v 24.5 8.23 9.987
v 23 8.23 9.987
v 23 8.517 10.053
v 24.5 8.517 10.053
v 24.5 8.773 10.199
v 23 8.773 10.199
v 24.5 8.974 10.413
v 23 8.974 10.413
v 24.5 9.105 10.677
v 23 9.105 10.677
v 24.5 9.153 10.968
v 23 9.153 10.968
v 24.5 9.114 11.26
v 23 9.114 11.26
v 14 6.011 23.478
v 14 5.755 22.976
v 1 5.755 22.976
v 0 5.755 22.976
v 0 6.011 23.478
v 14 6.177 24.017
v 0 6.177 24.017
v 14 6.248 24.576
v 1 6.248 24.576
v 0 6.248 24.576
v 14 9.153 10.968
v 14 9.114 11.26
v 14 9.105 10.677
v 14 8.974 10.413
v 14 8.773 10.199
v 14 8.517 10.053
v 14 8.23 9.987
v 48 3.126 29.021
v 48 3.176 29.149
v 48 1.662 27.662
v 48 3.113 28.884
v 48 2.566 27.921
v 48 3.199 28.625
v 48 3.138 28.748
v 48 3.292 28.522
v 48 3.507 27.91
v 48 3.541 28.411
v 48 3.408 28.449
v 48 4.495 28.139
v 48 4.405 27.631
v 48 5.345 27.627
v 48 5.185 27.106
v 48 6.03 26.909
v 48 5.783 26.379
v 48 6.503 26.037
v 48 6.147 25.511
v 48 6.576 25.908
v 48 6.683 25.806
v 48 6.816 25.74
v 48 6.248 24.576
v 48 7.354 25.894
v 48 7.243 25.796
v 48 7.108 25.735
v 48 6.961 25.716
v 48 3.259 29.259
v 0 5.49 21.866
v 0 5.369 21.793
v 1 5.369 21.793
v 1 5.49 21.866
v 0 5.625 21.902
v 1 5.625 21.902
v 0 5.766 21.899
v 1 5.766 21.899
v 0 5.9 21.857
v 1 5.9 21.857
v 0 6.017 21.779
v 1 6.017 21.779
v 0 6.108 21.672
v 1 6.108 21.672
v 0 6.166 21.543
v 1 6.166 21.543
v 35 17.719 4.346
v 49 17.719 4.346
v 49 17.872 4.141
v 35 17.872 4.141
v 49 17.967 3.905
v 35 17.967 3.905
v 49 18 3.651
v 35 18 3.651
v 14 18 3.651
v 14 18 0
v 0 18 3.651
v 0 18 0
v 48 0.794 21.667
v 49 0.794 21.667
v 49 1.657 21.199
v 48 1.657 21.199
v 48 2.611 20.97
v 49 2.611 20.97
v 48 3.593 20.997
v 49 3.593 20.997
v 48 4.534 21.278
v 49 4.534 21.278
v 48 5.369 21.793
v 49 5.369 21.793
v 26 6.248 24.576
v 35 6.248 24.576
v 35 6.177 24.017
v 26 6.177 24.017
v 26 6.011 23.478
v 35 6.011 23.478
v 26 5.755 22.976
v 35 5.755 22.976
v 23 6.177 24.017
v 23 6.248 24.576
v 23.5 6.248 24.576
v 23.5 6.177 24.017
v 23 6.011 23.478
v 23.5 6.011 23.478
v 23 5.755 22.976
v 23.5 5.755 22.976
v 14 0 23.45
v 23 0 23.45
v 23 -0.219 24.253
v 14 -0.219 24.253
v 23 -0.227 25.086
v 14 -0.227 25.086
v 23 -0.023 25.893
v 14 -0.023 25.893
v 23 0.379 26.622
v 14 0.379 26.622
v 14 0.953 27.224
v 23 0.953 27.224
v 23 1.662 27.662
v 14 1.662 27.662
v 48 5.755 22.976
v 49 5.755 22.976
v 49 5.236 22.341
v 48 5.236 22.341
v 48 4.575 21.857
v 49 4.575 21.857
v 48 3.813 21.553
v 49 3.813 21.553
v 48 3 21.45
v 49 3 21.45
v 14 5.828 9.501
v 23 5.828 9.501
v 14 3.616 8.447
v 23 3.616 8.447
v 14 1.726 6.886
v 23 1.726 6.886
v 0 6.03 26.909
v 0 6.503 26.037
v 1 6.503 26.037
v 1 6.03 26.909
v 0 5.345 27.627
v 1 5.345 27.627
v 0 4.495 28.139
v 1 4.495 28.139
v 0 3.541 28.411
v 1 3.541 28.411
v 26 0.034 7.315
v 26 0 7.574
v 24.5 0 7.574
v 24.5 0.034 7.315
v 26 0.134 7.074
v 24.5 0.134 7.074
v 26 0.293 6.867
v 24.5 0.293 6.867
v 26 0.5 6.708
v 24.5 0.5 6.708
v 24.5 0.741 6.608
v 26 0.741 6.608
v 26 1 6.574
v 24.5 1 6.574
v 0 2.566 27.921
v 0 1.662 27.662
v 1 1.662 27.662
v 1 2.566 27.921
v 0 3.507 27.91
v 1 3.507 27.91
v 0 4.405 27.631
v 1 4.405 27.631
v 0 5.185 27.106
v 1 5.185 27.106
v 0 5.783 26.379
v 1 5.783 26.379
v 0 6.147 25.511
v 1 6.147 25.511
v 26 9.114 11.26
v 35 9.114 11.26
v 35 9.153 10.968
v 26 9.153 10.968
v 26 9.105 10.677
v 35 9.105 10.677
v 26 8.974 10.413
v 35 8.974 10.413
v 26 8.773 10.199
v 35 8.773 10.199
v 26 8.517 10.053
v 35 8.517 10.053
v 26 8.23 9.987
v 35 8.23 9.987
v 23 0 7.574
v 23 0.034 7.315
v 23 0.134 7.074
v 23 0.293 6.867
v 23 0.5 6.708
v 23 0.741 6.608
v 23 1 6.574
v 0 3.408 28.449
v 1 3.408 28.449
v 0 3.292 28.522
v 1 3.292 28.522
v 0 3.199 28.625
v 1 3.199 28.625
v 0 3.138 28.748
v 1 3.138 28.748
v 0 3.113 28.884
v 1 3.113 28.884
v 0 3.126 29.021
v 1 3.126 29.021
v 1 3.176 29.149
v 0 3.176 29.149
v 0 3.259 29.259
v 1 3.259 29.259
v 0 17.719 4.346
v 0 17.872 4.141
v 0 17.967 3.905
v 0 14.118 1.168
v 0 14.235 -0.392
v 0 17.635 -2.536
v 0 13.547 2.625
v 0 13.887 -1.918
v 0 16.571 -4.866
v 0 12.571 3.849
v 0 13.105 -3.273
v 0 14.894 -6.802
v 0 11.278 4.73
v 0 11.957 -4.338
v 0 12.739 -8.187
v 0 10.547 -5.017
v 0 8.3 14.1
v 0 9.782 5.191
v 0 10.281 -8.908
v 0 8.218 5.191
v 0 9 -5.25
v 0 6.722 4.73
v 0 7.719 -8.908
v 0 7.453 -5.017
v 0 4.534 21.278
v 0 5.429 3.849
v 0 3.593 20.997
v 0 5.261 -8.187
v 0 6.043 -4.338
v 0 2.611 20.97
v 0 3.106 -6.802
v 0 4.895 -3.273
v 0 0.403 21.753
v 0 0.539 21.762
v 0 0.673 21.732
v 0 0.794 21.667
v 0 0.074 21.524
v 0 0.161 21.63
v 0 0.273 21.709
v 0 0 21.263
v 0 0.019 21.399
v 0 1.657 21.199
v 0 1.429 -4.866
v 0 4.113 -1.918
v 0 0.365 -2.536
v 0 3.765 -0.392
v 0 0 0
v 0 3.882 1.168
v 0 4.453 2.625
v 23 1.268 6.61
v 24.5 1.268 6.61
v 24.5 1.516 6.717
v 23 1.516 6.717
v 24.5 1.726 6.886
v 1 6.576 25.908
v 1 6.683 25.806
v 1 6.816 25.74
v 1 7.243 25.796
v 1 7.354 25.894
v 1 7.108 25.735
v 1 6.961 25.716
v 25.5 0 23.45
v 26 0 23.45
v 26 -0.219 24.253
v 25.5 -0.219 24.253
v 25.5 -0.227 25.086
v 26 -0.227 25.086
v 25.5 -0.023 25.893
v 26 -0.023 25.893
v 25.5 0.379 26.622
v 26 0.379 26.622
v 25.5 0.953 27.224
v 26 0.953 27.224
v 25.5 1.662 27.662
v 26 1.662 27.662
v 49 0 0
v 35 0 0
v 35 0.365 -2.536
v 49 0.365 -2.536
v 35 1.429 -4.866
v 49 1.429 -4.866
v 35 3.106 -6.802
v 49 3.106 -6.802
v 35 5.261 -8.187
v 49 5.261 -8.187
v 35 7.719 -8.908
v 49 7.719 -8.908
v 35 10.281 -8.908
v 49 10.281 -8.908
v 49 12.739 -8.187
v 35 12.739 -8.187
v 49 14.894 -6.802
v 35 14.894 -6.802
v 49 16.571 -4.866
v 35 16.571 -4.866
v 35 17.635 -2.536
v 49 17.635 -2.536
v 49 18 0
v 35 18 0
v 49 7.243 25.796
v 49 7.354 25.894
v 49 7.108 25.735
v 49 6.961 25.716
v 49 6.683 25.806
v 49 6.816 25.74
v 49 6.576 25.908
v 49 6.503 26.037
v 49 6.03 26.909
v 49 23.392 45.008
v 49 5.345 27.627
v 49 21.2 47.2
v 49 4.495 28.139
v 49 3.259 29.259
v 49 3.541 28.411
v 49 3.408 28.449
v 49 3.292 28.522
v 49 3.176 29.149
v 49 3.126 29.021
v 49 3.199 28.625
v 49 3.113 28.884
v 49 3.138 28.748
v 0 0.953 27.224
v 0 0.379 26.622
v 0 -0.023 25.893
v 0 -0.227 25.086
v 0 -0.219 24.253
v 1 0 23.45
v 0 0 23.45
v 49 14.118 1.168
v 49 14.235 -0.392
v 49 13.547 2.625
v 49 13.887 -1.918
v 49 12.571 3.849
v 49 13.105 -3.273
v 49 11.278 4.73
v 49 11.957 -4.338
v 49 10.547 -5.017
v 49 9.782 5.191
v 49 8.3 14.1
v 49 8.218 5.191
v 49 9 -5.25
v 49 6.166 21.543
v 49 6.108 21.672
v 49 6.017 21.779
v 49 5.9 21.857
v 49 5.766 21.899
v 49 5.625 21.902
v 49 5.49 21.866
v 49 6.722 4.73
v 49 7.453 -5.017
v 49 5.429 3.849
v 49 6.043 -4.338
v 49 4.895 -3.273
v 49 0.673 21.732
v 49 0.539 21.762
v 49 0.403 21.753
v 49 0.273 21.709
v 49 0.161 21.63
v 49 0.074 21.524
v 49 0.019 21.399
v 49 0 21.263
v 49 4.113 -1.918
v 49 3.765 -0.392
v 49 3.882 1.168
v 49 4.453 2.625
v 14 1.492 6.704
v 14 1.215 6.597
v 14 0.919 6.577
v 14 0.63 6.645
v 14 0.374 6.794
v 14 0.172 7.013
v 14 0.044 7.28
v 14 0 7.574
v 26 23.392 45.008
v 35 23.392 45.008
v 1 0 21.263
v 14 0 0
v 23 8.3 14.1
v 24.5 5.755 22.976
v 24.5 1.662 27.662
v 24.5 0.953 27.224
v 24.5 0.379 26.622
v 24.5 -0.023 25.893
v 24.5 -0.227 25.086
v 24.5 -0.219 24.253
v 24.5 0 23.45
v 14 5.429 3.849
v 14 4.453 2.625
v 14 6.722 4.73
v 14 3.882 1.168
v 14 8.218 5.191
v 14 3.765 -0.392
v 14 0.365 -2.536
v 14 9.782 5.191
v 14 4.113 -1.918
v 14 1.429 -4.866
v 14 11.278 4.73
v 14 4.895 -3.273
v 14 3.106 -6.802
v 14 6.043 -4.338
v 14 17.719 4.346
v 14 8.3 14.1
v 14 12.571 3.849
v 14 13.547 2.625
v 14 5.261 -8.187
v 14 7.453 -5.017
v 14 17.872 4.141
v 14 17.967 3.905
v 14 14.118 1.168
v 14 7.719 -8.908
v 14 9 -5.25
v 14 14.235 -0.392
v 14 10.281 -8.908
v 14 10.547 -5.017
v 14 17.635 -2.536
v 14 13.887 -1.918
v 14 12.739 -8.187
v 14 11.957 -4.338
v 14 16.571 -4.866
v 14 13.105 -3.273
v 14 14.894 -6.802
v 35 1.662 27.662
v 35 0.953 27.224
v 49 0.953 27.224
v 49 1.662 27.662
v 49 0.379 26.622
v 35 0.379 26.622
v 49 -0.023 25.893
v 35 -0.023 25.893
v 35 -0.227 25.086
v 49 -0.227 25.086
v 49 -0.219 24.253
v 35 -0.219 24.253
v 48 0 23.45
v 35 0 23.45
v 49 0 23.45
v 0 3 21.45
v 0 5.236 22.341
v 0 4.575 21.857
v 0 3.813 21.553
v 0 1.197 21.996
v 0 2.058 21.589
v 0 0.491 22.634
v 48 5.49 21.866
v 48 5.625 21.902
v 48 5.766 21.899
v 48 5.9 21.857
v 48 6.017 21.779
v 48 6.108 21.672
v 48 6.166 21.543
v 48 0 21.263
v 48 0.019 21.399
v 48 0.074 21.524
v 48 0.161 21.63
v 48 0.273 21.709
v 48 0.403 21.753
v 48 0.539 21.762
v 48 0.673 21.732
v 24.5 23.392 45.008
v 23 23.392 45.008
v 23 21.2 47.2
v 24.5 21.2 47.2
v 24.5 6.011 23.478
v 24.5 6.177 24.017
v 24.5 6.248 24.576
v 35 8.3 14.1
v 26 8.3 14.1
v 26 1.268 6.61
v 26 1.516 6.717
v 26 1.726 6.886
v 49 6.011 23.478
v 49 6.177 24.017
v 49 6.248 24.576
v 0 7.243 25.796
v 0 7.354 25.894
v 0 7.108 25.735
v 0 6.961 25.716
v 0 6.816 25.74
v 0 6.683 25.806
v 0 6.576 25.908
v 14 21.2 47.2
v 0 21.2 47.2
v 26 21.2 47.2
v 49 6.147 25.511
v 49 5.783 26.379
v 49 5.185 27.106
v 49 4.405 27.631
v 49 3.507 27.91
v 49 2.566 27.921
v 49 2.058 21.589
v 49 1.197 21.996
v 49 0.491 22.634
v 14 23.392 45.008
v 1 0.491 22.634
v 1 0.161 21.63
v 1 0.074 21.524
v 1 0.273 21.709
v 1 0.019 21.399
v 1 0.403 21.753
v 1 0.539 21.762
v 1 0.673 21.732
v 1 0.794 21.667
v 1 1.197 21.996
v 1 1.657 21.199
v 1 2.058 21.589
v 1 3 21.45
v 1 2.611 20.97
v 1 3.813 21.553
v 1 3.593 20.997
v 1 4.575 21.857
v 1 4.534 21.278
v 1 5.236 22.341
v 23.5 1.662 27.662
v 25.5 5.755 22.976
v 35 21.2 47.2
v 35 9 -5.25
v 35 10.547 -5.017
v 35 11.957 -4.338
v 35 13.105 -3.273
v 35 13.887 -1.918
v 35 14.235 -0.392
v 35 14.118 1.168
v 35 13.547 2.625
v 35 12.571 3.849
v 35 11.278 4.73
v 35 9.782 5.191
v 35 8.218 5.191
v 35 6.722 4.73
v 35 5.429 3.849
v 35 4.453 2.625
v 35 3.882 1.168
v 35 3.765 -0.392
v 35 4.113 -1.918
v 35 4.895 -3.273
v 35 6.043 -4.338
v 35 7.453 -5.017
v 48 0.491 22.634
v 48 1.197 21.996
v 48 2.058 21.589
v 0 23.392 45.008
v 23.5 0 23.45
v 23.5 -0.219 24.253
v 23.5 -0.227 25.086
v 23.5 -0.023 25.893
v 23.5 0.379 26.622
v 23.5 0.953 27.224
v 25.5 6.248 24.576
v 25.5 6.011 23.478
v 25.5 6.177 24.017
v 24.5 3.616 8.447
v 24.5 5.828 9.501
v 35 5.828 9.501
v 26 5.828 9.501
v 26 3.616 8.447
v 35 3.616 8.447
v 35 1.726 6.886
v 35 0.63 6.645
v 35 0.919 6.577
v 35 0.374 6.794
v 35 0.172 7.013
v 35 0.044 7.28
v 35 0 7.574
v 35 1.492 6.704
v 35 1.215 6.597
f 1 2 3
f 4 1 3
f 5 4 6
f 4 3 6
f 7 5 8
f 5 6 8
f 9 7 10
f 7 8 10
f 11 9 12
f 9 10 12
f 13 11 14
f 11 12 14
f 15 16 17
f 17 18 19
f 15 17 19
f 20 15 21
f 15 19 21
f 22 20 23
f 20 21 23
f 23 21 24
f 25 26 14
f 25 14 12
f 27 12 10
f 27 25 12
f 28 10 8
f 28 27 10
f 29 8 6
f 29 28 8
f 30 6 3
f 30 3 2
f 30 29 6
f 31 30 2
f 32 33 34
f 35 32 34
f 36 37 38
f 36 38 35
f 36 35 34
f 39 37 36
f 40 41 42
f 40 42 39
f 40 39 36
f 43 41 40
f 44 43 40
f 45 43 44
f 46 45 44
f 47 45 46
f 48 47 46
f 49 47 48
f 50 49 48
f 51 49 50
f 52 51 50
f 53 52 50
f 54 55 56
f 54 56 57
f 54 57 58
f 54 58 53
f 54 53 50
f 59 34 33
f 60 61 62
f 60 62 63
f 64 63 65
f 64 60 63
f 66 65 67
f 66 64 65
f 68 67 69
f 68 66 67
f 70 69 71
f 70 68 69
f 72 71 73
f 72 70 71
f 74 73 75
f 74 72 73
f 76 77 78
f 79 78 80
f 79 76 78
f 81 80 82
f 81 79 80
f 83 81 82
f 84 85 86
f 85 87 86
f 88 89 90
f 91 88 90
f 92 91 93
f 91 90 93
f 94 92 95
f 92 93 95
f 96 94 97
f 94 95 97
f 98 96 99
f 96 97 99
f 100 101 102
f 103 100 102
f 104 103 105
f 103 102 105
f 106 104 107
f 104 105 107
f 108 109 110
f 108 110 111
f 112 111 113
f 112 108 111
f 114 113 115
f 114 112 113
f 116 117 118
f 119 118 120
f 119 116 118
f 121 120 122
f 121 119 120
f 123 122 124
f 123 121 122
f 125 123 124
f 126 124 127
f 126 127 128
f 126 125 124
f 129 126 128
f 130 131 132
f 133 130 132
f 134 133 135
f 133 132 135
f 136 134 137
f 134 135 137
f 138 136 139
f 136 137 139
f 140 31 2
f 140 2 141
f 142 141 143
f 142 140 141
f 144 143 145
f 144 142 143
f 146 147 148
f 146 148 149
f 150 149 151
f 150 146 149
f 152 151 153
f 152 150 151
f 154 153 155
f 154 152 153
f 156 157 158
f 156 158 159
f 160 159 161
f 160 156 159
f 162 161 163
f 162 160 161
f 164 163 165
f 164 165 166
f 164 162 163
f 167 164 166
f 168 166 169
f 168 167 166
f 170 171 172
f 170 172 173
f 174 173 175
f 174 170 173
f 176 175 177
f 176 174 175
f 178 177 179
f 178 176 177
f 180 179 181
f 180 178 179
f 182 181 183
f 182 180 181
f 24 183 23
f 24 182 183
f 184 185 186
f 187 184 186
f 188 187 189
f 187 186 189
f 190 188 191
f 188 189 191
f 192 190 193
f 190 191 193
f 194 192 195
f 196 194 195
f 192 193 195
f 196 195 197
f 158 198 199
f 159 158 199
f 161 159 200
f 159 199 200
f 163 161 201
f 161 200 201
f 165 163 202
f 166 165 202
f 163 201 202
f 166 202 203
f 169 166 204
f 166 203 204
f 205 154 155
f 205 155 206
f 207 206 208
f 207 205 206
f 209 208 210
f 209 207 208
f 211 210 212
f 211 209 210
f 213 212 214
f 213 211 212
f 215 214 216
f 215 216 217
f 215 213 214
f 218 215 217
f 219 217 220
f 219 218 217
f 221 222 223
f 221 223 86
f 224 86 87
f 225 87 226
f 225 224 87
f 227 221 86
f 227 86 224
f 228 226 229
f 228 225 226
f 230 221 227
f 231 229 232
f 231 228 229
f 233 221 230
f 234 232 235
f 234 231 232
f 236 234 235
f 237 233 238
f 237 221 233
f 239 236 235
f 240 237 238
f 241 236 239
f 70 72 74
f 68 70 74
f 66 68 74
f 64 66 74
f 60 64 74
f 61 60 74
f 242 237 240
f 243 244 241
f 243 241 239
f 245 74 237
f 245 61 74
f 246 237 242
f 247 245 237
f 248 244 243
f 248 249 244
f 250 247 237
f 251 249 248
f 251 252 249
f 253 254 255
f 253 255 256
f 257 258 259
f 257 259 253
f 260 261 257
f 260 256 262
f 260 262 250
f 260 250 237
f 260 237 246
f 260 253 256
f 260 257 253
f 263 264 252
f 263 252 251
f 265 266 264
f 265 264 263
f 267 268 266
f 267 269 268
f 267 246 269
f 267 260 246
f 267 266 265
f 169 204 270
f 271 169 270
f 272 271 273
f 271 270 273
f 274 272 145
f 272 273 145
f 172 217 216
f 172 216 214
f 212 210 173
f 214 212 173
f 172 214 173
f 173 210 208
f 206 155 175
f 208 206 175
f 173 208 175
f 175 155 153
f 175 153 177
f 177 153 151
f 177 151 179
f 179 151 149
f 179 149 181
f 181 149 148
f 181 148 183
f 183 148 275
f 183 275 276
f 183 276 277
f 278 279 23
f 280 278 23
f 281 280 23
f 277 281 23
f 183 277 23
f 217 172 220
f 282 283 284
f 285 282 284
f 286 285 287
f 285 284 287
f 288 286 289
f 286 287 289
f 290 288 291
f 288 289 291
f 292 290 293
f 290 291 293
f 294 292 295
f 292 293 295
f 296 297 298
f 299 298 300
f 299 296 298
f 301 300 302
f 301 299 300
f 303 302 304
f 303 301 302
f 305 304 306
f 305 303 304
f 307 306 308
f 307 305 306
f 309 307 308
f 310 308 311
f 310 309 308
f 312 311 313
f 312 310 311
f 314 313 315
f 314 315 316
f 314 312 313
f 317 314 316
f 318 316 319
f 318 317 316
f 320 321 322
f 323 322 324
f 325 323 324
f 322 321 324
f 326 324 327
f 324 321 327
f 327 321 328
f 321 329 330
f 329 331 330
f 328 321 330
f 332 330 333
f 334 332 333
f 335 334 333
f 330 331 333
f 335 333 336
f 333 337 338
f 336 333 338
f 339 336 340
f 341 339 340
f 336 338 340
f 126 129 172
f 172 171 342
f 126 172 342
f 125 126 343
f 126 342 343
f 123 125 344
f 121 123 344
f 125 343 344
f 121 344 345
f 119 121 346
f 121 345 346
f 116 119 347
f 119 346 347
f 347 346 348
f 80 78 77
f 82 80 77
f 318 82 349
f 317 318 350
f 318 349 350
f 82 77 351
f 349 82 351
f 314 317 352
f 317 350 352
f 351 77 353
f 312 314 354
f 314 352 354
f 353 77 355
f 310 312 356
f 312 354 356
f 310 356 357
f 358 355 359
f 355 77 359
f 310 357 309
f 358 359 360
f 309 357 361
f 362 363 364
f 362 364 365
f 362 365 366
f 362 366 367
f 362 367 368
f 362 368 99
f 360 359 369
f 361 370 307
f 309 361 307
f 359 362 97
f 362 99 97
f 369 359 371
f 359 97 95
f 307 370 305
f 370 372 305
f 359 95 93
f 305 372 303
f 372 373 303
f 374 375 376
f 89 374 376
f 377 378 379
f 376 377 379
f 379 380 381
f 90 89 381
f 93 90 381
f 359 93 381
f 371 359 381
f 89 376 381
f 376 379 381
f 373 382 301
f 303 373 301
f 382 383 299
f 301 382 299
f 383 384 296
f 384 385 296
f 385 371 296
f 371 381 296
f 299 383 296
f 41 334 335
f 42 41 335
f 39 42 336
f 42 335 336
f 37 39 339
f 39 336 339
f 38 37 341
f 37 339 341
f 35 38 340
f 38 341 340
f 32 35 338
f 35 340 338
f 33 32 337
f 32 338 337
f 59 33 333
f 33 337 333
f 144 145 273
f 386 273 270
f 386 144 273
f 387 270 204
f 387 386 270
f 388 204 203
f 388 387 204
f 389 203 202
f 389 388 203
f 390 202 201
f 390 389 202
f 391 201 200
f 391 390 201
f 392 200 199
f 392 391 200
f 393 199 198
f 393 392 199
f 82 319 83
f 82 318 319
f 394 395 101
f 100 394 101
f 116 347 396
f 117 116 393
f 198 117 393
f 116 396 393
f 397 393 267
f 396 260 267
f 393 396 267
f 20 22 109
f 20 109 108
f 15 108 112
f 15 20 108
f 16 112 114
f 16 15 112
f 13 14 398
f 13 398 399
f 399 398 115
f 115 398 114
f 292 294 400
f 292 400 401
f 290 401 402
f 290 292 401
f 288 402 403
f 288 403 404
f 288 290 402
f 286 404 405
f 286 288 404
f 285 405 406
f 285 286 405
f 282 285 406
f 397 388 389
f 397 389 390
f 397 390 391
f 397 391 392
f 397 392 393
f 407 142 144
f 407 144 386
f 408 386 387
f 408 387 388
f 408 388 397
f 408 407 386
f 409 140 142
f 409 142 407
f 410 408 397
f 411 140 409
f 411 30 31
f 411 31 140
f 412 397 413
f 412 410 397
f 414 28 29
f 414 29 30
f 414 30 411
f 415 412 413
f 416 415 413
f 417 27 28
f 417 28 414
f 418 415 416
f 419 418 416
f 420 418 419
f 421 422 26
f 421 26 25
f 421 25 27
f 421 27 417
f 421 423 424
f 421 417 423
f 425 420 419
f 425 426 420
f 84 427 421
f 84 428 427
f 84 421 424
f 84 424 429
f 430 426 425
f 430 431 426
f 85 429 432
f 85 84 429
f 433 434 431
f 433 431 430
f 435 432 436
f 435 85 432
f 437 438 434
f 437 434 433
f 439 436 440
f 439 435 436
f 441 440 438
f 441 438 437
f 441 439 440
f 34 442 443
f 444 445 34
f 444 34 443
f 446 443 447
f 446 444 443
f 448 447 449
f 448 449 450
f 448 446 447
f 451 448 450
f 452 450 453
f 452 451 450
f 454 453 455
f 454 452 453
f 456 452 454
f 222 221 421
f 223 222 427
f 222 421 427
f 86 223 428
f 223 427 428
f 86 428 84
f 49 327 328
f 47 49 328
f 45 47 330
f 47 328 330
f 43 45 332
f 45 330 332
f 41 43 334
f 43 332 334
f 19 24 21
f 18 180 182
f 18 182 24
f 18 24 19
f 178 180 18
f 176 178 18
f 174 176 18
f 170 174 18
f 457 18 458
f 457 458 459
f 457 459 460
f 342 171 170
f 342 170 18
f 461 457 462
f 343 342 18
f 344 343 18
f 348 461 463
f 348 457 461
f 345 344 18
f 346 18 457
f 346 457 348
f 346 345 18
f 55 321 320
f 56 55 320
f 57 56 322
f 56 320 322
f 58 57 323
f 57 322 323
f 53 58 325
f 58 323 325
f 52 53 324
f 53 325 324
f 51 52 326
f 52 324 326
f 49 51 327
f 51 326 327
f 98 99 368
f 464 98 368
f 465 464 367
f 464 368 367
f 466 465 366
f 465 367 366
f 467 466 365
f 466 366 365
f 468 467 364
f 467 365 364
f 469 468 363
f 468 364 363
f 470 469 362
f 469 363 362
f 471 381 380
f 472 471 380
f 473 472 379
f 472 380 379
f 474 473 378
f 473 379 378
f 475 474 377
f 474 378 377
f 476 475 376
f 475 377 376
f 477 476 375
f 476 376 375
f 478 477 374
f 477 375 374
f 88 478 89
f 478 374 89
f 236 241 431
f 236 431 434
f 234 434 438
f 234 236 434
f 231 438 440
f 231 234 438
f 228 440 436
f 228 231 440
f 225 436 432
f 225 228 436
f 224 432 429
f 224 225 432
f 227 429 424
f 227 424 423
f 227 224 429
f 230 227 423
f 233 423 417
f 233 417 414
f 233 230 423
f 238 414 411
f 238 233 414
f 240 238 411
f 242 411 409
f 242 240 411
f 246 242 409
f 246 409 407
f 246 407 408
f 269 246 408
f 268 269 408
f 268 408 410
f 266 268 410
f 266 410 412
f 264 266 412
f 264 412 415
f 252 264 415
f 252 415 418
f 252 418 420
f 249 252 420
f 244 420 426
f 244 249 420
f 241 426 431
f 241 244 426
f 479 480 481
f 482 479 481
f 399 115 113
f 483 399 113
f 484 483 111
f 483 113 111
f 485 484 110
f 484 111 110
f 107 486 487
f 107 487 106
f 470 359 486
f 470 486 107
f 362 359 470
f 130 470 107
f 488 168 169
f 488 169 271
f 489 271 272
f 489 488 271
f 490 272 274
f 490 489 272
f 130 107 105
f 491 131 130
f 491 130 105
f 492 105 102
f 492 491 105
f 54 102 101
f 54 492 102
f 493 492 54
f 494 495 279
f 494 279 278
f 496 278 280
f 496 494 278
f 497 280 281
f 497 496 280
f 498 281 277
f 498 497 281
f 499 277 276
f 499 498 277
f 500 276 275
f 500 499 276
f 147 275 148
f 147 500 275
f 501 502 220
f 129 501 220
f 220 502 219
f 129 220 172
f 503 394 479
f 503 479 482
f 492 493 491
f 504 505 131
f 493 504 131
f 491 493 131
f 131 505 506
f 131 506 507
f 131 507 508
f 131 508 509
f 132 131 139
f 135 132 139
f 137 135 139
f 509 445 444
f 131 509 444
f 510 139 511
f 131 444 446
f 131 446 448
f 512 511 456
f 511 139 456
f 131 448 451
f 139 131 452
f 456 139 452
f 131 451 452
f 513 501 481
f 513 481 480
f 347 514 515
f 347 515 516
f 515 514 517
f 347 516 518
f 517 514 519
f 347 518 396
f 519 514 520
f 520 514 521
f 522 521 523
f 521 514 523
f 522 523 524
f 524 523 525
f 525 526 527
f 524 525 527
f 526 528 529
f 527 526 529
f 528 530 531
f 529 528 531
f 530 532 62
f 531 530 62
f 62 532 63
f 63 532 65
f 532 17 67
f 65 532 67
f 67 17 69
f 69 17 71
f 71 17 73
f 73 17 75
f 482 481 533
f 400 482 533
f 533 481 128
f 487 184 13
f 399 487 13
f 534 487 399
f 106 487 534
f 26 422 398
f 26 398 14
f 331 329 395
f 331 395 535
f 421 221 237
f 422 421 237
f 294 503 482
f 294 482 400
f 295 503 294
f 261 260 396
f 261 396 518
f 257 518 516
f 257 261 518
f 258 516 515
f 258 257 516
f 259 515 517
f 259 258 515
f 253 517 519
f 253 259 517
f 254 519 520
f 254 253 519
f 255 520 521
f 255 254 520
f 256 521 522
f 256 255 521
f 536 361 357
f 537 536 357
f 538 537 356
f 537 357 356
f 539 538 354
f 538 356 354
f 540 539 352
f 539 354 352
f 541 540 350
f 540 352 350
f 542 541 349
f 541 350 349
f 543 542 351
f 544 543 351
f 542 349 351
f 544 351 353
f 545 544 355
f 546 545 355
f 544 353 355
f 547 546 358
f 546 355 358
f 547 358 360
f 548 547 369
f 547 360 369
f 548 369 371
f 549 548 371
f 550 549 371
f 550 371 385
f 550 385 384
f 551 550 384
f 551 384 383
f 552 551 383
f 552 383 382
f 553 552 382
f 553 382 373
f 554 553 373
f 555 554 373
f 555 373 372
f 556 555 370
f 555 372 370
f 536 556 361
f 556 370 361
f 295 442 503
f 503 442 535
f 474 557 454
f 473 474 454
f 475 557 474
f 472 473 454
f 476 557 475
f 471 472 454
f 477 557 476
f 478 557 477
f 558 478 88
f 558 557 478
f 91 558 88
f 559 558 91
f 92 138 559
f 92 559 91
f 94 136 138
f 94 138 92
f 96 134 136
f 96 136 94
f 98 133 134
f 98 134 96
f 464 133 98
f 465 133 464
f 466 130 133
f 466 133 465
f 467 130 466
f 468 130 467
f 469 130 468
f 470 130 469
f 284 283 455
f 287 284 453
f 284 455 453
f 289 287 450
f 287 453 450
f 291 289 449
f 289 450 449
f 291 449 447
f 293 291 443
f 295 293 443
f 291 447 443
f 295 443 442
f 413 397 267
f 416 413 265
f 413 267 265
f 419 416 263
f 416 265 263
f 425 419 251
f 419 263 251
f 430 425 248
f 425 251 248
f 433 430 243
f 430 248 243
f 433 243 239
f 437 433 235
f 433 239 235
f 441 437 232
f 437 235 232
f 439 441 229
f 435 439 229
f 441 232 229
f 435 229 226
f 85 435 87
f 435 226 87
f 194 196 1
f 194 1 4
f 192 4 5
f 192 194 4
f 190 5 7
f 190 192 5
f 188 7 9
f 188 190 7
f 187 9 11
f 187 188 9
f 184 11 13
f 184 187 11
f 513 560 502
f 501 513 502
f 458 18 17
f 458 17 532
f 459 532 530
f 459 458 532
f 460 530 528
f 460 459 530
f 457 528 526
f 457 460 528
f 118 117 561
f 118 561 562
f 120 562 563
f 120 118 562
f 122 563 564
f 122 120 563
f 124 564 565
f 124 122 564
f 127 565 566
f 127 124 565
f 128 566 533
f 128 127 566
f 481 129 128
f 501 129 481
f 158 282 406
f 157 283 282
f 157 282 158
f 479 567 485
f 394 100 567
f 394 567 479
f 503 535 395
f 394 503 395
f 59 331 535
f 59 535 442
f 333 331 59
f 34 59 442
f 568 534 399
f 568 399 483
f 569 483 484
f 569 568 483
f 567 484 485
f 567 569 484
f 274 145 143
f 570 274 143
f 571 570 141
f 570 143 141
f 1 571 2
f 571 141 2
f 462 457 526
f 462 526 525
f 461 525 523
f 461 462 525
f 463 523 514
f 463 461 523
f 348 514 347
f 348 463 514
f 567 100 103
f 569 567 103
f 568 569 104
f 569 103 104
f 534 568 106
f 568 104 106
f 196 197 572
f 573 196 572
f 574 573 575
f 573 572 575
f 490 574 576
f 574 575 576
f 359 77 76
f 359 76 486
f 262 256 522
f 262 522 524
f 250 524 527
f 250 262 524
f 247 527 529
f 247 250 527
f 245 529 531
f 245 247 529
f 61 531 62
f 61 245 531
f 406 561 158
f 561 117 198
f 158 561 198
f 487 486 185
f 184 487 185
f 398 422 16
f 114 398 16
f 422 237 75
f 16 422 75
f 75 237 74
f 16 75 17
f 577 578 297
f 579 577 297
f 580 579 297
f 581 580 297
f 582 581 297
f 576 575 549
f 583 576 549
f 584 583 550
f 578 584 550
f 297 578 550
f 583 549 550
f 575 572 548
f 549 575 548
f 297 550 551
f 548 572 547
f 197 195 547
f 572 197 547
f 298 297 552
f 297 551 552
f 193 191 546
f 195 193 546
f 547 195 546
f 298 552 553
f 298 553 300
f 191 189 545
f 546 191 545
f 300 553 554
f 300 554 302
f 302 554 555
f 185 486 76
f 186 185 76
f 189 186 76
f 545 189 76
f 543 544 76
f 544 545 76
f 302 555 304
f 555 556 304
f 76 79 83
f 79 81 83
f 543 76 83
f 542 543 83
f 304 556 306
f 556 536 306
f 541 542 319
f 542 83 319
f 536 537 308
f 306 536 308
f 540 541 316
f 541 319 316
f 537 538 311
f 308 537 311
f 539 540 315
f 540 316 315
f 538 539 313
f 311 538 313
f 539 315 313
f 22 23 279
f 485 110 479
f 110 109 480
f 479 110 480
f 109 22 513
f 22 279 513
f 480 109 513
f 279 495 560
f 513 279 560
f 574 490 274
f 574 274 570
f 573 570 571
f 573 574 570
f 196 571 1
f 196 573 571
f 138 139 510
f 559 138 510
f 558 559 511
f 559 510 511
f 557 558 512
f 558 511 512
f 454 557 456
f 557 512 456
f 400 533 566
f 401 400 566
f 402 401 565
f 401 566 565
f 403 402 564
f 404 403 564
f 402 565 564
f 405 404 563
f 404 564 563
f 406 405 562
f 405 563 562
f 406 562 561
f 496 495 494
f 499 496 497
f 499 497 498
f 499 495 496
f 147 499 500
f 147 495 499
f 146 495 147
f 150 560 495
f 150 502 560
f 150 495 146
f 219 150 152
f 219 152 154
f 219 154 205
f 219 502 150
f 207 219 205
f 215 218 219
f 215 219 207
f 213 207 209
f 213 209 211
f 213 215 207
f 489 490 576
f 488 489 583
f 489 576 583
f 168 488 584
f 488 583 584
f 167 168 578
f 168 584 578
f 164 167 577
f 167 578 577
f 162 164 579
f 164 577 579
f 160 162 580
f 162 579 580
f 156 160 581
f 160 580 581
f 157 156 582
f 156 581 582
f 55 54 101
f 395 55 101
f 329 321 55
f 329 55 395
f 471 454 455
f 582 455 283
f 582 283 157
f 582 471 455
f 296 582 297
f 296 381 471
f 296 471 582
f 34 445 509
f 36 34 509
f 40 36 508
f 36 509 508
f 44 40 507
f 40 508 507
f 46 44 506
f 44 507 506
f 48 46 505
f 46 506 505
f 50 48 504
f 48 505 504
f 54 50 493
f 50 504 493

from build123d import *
from build123d.topology import SkipClean

# Parameters (mm, degrees)
SKETCH2_R               = 5.25
BOSS_EXTRUDE1_DEPTH     = 14
CUT_EXTRUDE1_DEPTH      = 1
CUT_EXTRUDE2_DEPTH      = 1
BOSS_EXTRUDE2_DEPTH     = 9
BOSS_EXTRUDE3_DEPTH     = 9.5
FILLET1_R               = 1
FILLET1_OF_MIRROR1_R    = 1
CUT_EXTRUDE3_DEPTH      = 57.347139
CUT_EXTRUDE3_DEPTH_BACK = 57.347139
BOSS_EXTRUDE4_DEPTH     = 1.5


with BuildPart() as part:
    # Sketch2 → Boss-Extrude1 (new body)
    with BuildSketch(Plane(origin=(0, 0, 0), x_dir=(0, 0, -1), z_dir=(1, 0, 0))):
        with BuildLine():
            ThreePointArc((0, 0), (9, 9), (0, 18))
            Line((0, 18), (-4.055356, 18))
            Line((-4.055356, 18), (-14.1, 8.3))
            Line((-14.1, 8.3), (-22.975774, 5.754913))
            ThreePointArc((-22.975774, 5.754913), (-23.743648, 6.106105), (-24.576075, 6.247636))
            Line((-24.576075, 6.247636), (-45.007969, 23.392031))
            Line((-45.007969, 23.392031), (-47.2, 21.2))
            Line((-47.2, 21.2), (-27.661634, 1.661634))
            ThreePointArc((-27.661634, 1.661634), (-25.892761, -0.023214), (-23.45, 0))
            Line((-23.45, 0), (0, 0))
        make_face()
        with Locations((0, 9)):
            Circle(SKETCH2_R, mode=Mode.SUBTRACT)
    boss_extrude1 = extrude(amount=-BOSS_EXTRUDE1_DEPTH)

    # Sketch2<5> → Cut-Extrude1 (cut)
    with BuildSketch(Plane(origin=(0, 0, 0), x_dir=(0, 0, -1), z_dir=(1, 0, 0))):
        with BuildLine():
            Line((-29.259155, 3.259155), (-27.661634, 1.661634))
            ThreePointArc((-27.661634, 1.661634), (-27.39648, 4.814248), (-24.576075, 6.247636))
            Line((-24.576075, 6.247636), (-25.894138, 7.353622))
            ThreePointArc((-25.894138, 7.353622), (-25.722467, 6.887608), (-26.037234, 6.503471))
            ThreePointArc((-26.037234, 6.503471), (-27.62666, 5.344603), (-28.410825, 3.540625))
            ThreePointArc((-28.410825, 3.540625), (-28.748146, 3.138148), (-29.259155, 3.259155))
        make_face()
    cut_extrude1 = extrude(amount=-CUT_EXTRUDE1_DEPTH, mode=Mode.SUBTRACT)

    # Sketch2<6> → Cut-Extrude2 (cut)
    with SkipClean():  # the faces are left unmerged after this step: merging them gives an invalid solid
        with BuildSketch(Plane(origin=(0, 0, 0), x_dir=(0, 0, -1), z_dir=(1, 0, 0))):
            with BuildLine():
                Line((-23.45, 0), (-21.263068, 0))
                ThreePointArc((-21.263068, 0), (-21.708635, 0.273129), (-21.667413, 0.794118))
                ThreePointArc((-21.667413, 0.794118), (-20.951416, 3.103029), (-21.793156, 5.369126))
                ThreePointArc((-21.793156, 5.369126), (-21.882672, 5.834611), (-21.543396, 6.165641))
                Line((-21.543396, 6.165641), (-22.975774, 5.754913))
                ThreePointArc((-22.975774, 5.754913), (-21.856918, 4.574606), (-21.45, 3))
                ThreePointArc((-21.45, 3), (-21.995837, 1.197224), (-23.45, 0))
            make_face()
        cut_extrude2 = extrude(amount=-CUT_EXTRUDE2_DEPTH, mode=Mode.SUBTRACT)

    # Sketch3 → Boss-Extrude2 (add)
    with SkipClean():  # the faces are left unmerged after this step: merging them gives an invalid solid
        with BuildSketch(Plane.ZY.offset(14)):
            with BuildLine():
                Line((47.2, 21.2), (45.007969, 23.392031))
                Line((45.007969, 23.392031), (24.576075, 6.247636))
                ThreePointArc((24.576075, 6.247636), (23.743648, 6.106105), (22.975774, 5.754913))
                Line((22.975774, 5.754913), (11.25959, 9.114474))
                ThreePointArc((11.25959, 9.114474), (10.413299, 8.974404), (9.986911, 8.230078))
                ThreePointArc((9.986911, 8.230078), (9.041707, 4.689697), (6.886416, 1.72618))
                ThreePointArc((6.886416, 1.72618), (6.644894, 0.629987), (7.57392, 0))
                Line((7.57392, 0), (23.45, 0))
                ThreePointArc((23.45, 0), (25.892761, -0.023214), (27.661634, 1.661634))
                Line((27.661634, 1.661634), (47.2, 21.2))
            make_face()
        boss_extrude2 = extrude(amount=BOSS_EXTRUDE2_DEPTH)

    # Sketch3<3> → Boss-Extrude3 (add)
    with SkipClean():  # the faces are left unmerged after this step: merging them gives an invalid solid
        with BuildSketch(Plane.ZY.offset(14)):
            with BuildLine():
                ThreePointArc((27.95, 3), (26.953857, 5.341501), (24.576075, 6.247636))
                ThreePointArc((24.576075, 6.247636), (23.743648, 6.106105), (22.975774, 5.754913))
                ThreePointArc((22.975774, 5.754913), (21.460978, 2.733093), (23.45, 0))
                ThreePointArc((23.45, 0), (25.892761, -0.023214), (27.661634, 1.661634))
                ThreePointArc((27.661634, 1.661634), (27.877091, 2.31546), (27.95, 3))
            make_face()
        boss_extrude3 = extrude(amount=BOSS_EXTRUDE3_DEPTH)

    # Fillet1
    fillet1_edges = [part.edges().sort_by_distance(p)[0] for p in [
        (-7, 18, 4.055356),
    ]]
    fillet(fillet1_edges, radius=FILLET1_R)

    # Mirror1: Boss-Extrude1, Cut-Extrude1, Cut-Extrude2, Boss-Extrude2, Boss-Extrude3 across plane
    with SkipClean():  # the faces are left unmerged after this step: merging them gives an invalid solid
        add(boss_extrude1.mirror(Plane(origin=(0, 0, 0), x_dir=(0, 0, 1), z_dir=(1, 0, 0))))
        add(cut_extrude1.mirror(Plane(origin=(0, 0, 0), x_dir=(0, 0, 1), z_dir=(1, 0, 0))), mode=Mode.SUBTRACT)
        add(cut_extrude2.mirror(Plane(origin=(0, 0, 0), x_dir=(0, 0, 1), z_dir=(1, 0, 0))), mode=Mode.SUBTRACT)
        add(boss_extrude2.mirror(Plane(origin=(0, 0, 0), x_dir=(0, 0, 1), z_dir=(1, 0, 0))))
        add(boss_extrude3.mirror(Plane(origin=(0, 0, 0), x_dir=(0, 0, 1), z_dir=(1, 0, 0))))

    # Fillet1 of Mirror1
    fillet1_of_mirror1_edges = [part.edges().sort_by_distance(p)[0] for p in [
        (7, 18, 4.055356),
    ]]
    fillet(fillet1_of_mirror1_edges, radius=FILLET1_OF_MIRROR1_R)

    # Sketch4 → Cut-Extrude3 (cut, two sides: drawn at the far end of the back side and taken through both)
    with SkipClean():  # the faces are left unmerged after this step: merging them gives an invalid solid
        with BuildSketch(Plane(origin=(0, -8.435091, 7.077882), x_dir=(1, 0, 0), z_dir=(0, 0.7660444431189767, -0.6427876096865409)).offset(-CUT_EXTRUDE3_DEPTH_BACK)):
            Polygon((0, 0), (0, -53.228637), (-37.923085, -53.228637), (-37.923085, 7.135531), (0, 7.135531), align=None)
        extrude(amount=CUT_EXTRUDE3_DEPTH + CUT_EXTRUDE3_DEPTH_BACK, mode=Mode.SUBTRACT)

    # Sketch7 → Boss-Extrude4 (add)
    with SkipClean():  # the faces are left unmerged after this step: merging them gives an invalid solid
        with BuildSketch(Plane(origin=(23, 0, 0), x_dir=(0, 0, -1), z_dir=(1, 0, 0))):
            with BuildLine():
                Line((-11.25959, 9.114474), (-22.975774, 5.754913))
                ThreePointArc((-22.975774, 5.754913), (-23.743648, 6.106105), (-24.576075, 6.247636))
                Line((-24.576075, 6.247636), (-45.007969, 23.392031))
                Line((-45.007969, 23.392031), (-47.2, 21.2))
                Line((-47.2, 21.2), (-27.661634, 1.661634))
                ThreePointArc((-27.661634, 1.661634), (-25.892761, -0.023214), (-23.45, 0))
                Line((-23.45, 0), (-7.57392, 0))
                ThreePointArc((-7.57392, 0), (-6.644894, 0.629987), (-6.886416, 1.72618))
                ThreePointArc((-6.886416, 1.72618), (-9.041707, 4.689697), (-9.986911, 8.230078))
                ThreePointArc((-9.986911, 8.230078), (-10.413299, 8.974404), (-11.25959, 9.114474))
            make_face()
        extrude(amount=BOSS_EXTRUDE4_DEPTH)

    # Mirror14: part across plane


with BuildPart() as part_1:
    with SkipClean():  # the faces are left unmerged after this step: merging them gives an invalid solid
        add(part.part)
        add(part.part.mirror(Plane(origin=(24.5, 0, 0), x_dir=(0, 0, 1), z_dir=(1, 0, 0))))


solid = part_1.part
